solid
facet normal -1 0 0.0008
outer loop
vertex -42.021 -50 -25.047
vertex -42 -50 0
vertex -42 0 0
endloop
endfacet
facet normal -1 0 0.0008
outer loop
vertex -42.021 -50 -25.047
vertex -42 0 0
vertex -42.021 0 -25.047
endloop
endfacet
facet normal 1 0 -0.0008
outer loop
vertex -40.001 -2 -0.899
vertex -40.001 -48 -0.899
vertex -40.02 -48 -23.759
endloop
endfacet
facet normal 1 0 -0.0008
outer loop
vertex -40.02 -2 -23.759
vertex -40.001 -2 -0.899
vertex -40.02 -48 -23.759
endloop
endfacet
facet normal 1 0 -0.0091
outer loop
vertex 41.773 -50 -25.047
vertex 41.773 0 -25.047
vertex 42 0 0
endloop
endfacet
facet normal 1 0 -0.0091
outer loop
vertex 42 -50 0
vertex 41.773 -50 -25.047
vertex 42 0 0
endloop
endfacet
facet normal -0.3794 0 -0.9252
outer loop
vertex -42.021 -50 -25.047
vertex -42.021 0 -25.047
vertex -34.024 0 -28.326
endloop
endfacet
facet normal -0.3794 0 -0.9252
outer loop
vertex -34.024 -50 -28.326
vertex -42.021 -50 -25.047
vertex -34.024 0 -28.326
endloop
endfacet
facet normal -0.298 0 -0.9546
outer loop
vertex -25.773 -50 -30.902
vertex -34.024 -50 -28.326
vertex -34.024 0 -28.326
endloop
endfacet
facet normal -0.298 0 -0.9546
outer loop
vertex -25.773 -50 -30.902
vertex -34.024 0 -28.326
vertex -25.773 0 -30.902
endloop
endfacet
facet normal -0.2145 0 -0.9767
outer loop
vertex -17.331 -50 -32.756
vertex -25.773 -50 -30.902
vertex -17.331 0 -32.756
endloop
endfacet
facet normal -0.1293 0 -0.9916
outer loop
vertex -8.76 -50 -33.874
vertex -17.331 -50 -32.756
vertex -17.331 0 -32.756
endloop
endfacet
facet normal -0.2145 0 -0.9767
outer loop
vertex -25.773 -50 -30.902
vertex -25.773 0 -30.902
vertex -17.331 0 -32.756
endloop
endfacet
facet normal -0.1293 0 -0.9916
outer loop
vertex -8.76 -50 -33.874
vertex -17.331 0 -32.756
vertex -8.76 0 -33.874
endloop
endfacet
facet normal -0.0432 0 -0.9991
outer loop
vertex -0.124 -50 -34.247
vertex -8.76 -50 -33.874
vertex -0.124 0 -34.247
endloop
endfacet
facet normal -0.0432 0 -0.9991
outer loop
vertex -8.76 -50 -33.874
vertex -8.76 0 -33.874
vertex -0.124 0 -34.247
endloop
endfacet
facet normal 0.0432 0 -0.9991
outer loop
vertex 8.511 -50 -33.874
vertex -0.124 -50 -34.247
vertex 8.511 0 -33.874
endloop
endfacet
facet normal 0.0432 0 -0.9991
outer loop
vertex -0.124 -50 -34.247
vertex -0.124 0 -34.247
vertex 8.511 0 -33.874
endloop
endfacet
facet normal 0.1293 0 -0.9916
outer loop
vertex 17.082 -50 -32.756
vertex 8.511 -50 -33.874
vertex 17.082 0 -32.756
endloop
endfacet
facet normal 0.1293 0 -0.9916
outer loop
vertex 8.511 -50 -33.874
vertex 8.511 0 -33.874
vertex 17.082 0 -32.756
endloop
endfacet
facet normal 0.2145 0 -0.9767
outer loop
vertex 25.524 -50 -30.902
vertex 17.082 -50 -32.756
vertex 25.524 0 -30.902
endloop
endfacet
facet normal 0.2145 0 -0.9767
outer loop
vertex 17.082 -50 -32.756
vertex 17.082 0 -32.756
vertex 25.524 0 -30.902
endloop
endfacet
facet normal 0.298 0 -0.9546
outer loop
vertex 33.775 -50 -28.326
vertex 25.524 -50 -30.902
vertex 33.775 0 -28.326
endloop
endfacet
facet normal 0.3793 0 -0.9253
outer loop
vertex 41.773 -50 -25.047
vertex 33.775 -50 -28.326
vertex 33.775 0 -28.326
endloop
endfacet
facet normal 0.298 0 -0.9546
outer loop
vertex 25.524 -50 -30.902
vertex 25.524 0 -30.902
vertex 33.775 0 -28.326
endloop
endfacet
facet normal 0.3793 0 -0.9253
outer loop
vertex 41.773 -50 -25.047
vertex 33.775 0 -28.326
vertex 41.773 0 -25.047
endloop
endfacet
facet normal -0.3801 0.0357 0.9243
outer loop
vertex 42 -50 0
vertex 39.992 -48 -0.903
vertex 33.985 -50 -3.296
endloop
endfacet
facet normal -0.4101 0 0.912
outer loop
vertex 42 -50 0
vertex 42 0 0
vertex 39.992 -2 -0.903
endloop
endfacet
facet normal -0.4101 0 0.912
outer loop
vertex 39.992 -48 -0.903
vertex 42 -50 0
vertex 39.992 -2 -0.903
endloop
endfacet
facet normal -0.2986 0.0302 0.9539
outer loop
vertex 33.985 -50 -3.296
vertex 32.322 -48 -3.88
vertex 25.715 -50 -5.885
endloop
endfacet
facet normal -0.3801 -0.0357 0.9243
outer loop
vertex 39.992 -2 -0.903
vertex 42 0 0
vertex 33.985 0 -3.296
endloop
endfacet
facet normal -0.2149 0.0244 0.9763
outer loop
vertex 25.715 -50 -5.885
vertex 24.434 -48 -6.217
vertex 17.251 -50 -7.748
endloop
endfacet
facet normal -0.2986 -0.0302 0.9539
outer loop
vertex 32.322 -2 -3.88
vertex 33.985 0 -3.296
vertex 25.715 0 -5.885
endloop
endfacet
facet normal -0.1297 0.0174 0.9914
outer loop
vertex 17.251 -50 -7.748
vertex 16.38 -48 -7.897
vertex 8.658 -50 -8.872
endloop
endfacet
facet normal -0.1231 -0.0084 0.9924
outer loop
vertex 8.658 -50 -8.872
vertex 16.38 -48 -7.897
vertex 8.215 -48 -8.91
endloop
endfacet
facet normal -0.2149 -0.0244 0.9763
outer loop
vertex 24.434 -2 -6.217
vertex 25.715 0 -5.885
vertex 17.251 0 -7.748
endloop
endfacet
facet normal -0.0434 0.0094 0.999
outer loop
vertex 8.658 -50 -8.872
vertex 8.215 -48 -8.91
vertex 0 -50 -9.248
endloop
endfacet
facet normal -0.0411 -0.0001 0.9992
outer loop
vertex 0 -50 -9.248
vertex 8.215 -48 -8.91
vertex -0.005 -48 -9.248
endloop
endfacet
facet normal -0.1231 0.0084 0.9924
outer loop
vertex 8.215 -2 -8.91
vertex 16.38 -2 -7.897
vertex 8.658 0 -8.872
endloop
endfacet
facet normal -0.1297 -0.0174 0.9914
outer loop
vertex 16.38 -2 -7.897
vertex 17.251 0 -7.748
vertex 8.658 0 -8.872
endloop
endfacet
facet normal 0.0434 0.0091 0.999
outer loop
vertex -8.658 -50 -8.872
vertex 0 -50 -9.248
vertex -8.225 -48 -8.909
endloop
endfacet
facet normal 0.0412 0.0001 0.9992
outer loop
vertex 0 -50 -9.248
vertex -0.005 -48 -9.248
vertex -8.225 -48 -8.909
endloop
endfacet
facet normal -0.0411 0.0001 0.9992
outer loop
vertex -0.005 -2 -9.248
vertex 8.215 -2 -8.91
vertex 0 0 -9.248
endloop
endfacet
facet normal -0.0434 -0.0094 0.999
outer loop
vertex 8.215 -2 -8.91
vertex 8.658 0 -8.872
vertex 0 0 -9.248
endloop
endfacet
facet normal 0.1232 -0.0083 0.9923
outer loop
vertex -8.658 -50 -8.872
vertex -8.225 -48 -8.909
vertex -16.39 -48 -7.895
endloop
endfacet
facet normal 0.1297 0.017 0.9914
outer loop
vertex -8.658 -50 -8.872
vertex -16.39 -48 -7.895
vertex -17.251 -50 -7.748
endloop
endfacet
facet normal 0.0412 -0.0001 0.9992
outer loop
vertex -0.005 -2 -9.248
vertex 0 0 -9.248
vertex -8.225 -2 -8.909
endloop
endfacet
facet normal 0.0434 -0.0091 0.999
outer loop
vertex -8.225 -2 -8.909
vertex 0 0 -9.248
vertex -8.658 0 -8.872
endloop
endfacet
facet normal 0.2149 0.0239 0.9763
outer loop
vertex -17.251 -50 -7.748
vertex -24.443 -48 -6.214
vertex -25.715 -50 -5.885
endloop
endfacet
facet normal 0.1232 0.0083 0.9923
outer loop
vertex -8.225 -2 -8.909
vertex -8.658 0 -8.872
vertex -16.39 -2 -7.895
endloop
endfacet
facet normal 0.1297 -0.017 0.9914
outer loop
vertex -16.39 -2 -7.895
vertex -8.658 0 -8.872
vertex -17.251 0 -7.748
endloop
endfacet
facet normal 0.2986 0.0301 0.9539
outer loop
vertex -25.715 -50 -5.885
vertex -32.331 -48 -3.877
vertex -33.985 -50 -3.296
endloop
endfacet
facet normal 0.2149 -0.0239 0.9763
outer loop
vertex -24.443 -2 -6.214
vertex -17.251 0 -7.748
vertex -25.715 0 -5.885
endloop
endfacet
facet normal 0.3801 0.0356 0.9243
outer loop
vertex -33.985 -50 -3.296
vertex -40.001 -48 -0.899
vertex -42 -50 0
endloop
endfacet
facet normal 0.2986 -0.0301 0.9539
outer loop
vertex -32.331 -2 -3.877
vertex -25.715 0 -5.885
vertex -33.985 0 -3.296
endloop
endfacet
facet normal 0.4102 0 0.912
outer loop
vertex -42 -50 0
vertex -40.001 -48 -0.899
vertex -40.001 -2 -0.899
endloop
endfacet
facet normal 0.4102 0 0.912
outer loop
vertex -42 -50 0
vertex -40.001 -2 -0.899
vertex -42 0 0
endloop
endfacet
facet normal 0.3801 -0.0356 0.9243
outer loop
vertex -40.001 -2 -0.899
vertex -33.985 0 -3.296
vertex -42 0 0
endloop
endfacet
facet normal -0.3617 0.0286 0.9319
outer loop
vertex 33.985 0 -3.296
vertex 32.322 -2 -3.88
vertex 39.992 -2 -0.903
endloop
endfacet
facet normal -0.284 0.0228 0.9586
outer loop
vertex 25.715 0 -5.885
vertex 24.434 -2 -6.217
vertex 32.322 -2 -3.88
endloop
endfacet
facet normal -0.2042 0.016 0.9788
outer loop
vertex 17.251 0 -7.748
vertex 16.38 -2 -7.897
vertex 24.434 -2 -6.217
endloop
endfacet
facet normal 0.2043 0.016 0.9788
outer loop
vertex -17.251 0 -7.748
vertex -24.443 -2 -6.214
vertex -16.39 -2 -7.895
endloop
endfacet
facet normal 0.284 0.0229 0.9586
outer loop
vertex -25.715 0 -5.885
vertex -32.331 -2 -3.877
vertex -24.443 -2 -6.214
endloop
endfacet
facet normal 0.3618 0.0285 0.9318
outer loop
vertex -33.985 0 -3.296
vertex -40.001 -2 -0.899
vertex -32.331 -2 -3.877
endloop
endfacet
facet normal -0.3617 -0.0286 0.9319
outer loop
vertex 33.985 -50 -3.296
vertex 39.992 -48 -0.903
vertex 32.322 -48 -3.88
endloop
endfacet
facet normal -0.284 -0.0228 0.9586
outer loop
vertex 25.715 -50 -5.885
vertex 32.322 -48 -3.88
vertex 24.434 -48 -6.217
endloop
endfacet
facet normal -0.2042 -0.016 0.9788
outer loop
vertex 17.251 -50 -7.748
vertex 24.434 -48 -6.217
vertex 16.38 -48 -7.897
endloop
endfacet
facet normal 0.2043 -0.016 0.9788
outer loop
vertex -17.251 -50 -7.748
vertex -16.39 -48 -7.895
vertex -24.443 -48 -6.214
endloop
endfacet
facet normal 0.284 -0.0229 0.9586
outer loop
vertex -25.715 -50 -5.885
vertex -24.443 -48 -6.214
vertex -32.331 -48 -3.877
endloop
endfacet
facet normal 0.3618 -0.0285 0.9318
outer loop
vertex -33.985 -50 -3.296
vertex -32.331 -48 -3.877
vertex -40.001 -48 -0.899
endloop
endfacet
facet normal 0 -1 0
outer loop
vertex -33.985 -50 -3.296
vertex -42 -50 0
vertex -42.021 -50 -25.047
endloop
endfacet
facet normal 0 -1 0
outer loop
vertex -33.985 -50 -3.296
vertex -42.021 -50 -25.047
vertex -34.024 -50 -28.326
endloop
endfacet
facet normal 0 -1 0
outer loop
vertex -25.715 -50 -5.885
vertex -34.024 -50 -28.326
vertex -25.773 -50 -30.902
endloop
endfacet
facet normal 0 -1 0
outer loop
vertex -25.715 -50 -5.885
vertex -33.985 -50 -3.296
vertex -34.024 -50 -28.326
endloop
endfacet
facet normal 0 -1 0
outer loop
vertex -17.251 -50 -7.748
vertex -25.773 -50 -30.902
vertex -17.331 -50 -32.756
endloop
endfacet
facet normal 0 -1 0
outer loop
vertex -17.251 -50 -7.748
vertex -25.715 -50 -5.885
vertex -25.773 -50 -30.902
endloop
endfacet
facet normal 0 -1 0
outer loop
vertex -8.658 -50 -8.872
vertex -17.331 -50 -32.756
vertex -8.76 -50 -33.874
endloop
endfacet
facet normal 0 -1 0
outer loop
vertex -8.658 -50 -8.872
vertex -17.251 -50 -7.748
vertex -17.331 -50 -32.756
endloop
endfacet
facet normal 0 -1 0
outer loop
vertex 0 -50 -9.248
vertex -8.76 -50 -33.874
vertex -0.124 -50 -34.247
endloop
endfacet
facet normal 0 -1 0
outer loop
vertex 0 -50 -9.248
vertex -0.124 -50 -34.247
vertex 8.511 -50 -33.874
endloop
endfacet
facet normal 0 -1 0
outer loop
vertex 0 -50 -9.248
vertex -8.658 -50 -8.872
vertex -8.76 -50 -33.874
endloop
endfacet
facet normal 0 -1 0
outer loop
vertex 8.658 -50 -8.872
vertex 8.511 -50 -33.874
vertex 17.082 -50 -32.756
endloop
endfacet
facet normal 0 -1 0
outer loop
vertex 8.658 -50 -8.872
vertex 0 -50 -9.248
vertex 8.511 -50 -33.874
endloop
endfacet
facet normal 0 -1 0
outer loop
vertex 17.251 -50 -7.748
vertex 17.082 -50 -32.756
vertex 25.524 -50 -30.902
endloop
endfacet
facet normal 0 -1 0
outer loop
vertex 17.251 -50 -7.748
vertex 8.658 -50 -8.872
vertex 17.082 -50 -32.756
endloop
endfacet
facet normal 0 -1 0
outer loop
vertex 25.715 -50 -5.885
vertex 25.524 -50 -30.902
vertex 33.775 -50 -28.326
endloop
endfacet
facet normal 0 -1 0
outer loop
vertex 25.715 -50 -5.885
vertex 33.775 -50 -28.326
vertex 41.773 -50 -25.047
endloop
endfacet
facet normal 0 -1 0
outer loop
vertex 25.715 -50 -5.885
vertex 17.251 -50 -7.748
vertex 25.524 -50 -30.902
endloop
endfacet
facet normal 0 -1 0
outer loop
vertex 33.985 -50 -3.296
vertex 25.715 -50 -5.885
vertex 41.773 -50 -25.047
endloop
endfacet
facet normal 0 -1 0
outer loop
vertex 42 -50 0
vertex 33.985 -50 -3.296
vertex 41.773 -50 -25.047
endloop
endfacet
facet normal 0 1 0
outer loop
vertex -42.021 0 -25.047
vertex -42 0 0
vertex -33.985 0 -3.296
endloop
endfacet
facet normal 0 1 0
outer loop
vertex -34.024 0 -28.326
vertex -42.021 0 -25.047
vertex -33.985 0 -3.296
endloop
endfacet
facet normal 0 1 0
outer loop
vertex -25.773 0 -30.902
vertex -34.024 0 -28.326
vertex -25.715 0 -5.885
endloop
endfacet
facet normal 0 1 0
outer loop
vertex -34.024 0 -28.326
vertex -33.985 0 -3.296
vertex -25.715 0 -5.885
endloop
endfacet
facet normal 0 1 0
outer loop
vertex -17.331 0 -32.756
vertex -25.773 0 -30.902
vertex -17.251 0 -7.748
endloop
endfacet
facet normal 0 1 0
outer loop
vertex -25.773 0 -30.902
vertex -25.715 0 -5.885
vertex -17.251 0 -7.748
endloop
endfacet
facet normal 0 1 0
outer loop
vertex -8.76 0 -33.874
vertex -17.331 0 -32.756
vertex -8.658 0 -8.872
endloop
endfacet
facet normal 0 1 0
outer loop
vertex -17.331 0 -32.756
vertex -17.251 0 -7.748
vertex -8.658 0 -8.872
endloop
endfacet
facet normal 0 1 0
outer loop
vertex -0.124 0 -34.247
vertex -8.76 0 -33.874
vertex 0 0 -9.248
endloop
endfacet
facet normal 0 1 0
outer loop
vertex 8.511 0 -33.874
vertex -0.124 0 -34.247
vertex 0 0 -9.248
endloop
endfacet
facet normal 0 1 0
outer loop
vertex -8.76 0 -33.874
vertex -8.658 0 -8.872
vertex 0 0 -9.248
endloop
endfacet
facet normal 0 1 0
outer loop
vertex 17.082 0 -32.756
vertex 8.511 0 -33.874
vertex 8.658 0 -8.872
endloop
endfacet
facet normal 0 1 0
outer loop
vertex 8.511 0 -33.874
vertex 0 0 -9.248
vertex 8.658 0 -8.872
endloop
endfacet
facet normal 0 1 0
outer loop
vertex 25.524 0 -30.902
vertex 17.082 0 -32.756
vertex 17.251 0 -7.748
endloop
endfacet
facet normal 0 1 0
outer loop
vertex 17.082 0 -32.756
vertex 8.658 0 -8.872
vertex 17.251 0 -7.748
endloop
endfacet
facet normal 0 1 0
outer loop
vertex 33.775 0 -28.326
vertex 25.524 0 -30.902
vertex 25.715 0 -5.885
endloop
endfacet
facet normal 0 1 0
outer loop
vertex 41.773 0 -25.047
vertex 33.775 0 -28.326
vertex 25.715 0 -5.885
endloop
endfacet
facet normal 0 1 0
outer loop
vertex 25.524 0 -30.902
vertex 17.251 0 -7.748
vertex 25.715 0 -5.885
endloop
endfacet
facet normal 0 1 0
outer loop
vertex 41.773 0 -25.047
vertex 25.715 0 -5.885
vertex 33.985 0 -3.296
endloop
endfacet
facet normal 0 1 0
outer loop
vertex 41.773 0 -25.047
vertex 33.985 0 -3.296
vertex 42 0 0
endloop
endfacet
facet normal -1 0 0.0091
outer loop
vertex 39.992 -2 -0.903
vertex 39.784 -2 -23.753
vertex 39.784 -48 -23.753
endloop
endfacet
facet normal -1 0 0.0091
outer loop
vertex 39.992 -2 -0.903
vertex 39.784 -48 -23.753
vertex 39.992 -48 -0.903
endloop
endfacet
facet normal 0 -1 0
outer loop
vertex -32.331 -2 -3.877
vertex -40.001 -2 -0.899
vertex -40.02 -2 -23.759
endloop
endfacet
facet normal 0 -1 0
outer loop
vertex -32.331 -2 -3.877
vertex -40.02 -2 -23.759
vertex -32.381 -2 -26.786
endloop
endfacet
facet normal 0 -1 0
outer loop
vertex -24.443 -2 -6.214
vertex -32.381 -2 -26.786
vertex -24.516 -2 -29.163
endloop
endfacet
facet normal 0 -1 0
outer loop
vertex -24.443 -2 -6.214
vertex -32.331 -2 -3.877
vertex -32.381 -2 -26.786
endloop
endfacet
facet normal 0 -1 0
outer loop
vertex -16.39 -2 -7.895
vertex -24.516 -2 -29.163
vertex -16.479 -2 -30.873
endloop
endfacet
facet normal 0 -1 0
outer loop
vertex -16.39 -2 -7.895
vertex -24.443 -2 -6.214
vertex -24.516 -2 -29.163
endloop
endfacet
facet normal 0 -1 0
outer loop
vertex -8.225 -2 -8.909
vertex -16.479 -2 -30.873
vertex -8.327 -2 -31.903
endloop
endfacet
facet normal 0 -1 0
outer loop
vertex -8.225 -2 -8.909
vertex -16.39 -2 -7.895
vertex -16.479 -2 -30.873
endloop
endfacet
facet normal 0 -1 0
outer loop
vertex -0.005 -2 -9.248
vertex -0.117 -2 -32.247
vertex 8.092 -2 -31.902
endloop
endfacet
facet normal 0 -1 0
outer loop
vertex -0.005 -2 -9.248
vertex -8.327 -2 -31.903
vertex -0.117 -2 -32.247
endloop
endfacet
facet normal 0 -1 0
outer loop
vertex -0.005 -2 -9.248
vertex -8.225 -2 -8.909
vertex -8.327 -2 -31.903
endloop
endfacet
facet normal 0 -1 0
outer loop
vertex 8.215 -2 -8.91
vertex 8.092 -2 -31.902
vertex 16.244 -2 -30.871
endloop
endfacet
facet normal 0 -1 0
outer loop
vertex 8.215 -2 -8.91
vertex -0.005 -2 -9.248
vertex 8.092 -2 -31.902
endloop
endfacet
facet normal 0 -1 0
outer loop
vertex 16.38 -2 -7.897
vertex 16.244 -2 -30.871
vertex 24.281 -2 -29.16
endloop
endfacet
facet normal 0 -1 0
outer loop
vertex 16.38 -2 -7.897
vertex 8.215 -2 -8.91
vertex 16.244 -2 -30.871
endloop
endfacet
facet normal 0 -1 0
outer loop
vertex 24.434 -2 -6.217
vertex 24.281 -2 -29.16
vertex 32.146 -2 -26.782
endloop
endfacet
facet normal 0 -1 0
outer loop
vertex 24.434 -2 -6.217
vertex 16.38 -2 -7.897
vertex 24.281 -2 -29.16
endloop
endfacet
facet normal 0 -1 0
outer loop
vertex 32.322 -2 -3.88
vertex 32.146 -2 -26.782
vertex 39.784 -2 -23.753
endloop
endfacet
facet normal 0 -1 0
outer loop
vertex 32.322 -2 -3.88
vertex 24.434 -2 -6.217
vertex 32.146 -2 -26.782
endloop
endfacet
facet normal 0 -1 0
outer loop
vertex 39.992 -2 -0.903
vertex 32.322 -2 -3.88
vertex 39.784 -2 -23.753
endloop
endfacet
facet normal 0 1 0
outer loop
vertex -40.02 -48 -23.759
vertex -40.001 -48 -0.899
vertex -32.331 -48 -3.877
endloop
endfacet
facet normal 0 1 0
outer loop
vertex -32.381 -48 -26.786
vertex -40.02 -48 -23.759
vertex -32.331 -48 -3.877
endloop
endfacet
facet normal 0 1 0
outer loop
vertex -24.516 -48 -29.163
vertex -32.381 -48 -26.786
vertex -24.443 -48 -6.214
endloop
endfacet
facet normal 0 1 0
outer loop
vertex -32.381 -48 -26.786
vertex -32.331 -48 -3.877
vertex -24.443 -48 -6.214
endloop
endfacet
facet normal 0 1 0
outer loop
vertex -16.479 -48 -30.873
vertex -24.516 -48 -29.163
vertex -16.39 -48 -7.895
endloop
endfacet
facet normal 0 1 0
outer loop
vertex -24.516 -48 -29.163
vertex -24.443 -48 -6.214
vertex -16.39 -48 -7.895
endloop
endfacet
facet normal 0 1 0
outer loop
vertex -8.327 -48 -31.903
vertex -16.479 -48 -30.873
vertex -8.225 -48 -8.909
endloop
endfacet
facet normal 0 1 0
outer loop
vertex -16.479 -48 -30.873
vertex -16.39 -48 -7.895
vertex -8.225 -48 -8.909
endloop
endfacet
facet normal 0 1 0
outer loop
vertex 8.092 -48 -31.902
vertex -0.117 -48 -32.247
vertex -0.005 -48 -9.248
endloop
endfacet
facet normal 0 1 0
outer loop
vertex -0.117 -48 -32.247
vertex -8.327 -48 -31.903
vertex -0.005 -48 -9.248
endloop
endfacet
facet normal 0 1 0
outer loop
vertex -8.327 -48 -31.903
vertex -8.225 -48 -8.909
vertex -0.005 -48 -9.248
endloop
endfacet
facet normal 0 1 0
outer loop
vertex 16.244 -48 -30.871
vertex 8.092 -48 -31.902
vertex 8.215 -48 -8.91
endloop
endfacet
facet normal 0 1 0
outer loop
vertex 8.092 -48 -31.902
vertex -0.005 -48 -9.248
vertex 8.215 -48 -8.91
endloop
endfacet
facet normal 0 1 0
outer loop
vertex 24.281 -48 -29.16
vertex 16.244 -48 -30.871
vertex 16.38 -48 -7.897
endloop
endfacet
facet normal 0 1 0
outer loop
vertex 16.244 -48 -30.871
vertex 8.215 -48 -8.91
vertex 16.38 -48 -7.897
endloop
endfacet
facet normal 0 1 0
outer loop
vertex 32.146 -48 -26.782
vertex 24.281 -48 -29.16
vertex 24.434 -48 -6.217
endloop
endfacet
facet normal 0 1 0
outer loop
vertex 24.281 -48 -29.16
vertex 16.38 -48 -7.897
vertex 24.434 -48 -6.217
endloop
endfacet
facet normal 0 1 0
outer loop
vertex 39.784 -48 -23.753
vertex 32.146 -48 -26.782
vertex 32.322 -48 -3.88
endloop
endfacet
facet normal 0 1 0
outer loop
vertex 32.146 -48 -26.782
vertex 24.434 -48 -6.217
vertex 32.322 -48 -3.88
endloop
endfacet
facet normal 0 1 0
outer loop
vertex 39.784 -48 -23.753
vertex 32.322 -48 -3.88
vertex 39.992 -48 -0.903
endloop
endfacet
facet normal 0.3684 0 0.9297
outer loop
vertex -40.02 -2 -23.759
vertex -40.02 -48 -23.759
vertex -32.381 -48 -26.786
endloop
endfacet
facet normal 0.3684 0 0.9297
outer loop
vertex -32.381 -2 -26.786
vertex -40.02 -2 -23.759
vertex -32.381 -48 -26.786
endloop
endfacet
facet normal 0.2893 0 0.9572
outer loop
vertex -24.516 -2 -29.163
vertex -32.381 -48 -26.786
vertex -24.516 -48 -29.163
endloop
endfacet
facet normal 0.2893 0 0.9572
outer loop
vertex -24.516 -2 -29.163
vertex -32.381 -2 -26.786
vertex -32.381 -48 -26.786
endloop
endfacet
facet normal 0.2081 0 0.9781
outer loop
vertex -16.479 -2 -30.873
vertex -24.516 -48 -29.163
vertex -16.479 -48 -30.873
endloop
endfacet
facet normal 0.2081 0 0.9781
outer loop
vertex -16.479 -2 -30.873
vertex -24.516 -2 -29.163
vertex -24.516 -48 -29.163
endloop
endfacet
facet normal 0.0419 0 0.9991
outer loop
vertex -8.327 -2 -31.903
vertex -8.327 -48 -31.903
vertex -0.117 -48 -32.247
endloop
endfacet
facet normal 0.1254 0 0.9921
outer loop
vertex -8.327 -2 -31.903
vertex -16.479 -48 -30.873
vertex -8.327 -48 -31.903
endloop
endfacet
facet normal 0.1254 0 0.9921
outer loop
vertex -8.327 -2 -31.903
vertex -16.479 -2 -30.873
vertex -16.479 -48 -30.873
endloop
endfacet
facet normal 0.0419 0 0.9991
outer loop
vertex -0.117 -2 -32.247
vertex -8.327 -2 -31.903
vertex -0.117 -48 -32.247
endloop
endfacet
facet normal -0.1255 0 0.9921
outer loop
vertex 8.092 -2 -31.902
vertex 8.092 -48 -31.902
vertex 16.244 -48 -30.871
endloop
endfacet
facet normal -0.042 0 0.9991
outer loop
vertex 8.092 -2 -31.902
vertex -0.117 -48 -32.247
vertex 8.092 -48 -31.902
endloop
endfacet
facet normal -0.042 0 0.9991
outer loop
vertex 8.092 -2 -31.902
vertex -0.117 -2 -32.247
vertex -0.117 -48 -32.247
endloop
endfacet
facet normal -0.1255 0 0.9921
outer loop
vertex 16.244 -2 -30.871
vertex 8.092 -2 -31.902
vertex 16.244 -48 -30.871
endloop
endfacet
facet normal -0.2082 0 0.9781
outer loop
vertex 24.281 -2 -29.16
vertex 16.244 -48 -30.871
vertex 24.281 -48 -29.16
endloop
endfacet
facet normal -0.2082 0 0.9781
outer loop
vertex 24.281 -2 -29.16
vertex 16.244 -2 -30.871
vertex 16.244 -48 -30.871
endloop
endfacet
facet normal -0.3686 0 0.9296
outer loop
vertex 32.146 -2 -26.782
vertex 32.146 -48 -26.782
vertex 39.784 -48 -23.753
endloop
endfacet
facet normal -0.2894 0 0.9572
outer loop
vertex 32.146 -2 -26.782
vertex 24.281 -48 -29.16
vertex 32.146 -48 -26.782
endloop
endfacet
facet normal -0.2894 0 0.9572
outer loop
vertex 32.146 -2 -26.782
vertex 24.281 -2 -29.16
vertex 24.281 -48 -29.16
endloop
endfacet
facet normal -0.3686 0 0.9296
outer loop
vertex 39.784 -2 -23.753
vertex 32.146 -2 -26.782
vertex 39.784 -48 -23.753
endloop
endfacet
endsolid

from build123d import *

# Parameters (mm, degrees)
F1_DEPTH = 50
F2_T     = -2


with BuildPart() as f1:
    # F0 (on Front) → F1 (new body)
    with BuildSketch(Plane.XZ):
        with BuildLine():
            ThreePointArc((42, 0), (0, -9.24759), (-42, 0))
            Line((-42, 0), (-42.021068, -25.047362))
            ThreePointArc((-42.021068, -25.047362), (-0.124227, -34.247281), (41.772614, -25.047362))
            Line((41.772614, -25.047362), (42, 0))
        make_face()
    extrude(amount=F1_DEPTH)

    # F2
    f2_openings = [f1.faces().sort_by_distance(p)[0] for p in [
        (0, -25, -9.24759),
    ]]
    offset(amount=F2_T, openings=f2_openings)


solid = f1.part
